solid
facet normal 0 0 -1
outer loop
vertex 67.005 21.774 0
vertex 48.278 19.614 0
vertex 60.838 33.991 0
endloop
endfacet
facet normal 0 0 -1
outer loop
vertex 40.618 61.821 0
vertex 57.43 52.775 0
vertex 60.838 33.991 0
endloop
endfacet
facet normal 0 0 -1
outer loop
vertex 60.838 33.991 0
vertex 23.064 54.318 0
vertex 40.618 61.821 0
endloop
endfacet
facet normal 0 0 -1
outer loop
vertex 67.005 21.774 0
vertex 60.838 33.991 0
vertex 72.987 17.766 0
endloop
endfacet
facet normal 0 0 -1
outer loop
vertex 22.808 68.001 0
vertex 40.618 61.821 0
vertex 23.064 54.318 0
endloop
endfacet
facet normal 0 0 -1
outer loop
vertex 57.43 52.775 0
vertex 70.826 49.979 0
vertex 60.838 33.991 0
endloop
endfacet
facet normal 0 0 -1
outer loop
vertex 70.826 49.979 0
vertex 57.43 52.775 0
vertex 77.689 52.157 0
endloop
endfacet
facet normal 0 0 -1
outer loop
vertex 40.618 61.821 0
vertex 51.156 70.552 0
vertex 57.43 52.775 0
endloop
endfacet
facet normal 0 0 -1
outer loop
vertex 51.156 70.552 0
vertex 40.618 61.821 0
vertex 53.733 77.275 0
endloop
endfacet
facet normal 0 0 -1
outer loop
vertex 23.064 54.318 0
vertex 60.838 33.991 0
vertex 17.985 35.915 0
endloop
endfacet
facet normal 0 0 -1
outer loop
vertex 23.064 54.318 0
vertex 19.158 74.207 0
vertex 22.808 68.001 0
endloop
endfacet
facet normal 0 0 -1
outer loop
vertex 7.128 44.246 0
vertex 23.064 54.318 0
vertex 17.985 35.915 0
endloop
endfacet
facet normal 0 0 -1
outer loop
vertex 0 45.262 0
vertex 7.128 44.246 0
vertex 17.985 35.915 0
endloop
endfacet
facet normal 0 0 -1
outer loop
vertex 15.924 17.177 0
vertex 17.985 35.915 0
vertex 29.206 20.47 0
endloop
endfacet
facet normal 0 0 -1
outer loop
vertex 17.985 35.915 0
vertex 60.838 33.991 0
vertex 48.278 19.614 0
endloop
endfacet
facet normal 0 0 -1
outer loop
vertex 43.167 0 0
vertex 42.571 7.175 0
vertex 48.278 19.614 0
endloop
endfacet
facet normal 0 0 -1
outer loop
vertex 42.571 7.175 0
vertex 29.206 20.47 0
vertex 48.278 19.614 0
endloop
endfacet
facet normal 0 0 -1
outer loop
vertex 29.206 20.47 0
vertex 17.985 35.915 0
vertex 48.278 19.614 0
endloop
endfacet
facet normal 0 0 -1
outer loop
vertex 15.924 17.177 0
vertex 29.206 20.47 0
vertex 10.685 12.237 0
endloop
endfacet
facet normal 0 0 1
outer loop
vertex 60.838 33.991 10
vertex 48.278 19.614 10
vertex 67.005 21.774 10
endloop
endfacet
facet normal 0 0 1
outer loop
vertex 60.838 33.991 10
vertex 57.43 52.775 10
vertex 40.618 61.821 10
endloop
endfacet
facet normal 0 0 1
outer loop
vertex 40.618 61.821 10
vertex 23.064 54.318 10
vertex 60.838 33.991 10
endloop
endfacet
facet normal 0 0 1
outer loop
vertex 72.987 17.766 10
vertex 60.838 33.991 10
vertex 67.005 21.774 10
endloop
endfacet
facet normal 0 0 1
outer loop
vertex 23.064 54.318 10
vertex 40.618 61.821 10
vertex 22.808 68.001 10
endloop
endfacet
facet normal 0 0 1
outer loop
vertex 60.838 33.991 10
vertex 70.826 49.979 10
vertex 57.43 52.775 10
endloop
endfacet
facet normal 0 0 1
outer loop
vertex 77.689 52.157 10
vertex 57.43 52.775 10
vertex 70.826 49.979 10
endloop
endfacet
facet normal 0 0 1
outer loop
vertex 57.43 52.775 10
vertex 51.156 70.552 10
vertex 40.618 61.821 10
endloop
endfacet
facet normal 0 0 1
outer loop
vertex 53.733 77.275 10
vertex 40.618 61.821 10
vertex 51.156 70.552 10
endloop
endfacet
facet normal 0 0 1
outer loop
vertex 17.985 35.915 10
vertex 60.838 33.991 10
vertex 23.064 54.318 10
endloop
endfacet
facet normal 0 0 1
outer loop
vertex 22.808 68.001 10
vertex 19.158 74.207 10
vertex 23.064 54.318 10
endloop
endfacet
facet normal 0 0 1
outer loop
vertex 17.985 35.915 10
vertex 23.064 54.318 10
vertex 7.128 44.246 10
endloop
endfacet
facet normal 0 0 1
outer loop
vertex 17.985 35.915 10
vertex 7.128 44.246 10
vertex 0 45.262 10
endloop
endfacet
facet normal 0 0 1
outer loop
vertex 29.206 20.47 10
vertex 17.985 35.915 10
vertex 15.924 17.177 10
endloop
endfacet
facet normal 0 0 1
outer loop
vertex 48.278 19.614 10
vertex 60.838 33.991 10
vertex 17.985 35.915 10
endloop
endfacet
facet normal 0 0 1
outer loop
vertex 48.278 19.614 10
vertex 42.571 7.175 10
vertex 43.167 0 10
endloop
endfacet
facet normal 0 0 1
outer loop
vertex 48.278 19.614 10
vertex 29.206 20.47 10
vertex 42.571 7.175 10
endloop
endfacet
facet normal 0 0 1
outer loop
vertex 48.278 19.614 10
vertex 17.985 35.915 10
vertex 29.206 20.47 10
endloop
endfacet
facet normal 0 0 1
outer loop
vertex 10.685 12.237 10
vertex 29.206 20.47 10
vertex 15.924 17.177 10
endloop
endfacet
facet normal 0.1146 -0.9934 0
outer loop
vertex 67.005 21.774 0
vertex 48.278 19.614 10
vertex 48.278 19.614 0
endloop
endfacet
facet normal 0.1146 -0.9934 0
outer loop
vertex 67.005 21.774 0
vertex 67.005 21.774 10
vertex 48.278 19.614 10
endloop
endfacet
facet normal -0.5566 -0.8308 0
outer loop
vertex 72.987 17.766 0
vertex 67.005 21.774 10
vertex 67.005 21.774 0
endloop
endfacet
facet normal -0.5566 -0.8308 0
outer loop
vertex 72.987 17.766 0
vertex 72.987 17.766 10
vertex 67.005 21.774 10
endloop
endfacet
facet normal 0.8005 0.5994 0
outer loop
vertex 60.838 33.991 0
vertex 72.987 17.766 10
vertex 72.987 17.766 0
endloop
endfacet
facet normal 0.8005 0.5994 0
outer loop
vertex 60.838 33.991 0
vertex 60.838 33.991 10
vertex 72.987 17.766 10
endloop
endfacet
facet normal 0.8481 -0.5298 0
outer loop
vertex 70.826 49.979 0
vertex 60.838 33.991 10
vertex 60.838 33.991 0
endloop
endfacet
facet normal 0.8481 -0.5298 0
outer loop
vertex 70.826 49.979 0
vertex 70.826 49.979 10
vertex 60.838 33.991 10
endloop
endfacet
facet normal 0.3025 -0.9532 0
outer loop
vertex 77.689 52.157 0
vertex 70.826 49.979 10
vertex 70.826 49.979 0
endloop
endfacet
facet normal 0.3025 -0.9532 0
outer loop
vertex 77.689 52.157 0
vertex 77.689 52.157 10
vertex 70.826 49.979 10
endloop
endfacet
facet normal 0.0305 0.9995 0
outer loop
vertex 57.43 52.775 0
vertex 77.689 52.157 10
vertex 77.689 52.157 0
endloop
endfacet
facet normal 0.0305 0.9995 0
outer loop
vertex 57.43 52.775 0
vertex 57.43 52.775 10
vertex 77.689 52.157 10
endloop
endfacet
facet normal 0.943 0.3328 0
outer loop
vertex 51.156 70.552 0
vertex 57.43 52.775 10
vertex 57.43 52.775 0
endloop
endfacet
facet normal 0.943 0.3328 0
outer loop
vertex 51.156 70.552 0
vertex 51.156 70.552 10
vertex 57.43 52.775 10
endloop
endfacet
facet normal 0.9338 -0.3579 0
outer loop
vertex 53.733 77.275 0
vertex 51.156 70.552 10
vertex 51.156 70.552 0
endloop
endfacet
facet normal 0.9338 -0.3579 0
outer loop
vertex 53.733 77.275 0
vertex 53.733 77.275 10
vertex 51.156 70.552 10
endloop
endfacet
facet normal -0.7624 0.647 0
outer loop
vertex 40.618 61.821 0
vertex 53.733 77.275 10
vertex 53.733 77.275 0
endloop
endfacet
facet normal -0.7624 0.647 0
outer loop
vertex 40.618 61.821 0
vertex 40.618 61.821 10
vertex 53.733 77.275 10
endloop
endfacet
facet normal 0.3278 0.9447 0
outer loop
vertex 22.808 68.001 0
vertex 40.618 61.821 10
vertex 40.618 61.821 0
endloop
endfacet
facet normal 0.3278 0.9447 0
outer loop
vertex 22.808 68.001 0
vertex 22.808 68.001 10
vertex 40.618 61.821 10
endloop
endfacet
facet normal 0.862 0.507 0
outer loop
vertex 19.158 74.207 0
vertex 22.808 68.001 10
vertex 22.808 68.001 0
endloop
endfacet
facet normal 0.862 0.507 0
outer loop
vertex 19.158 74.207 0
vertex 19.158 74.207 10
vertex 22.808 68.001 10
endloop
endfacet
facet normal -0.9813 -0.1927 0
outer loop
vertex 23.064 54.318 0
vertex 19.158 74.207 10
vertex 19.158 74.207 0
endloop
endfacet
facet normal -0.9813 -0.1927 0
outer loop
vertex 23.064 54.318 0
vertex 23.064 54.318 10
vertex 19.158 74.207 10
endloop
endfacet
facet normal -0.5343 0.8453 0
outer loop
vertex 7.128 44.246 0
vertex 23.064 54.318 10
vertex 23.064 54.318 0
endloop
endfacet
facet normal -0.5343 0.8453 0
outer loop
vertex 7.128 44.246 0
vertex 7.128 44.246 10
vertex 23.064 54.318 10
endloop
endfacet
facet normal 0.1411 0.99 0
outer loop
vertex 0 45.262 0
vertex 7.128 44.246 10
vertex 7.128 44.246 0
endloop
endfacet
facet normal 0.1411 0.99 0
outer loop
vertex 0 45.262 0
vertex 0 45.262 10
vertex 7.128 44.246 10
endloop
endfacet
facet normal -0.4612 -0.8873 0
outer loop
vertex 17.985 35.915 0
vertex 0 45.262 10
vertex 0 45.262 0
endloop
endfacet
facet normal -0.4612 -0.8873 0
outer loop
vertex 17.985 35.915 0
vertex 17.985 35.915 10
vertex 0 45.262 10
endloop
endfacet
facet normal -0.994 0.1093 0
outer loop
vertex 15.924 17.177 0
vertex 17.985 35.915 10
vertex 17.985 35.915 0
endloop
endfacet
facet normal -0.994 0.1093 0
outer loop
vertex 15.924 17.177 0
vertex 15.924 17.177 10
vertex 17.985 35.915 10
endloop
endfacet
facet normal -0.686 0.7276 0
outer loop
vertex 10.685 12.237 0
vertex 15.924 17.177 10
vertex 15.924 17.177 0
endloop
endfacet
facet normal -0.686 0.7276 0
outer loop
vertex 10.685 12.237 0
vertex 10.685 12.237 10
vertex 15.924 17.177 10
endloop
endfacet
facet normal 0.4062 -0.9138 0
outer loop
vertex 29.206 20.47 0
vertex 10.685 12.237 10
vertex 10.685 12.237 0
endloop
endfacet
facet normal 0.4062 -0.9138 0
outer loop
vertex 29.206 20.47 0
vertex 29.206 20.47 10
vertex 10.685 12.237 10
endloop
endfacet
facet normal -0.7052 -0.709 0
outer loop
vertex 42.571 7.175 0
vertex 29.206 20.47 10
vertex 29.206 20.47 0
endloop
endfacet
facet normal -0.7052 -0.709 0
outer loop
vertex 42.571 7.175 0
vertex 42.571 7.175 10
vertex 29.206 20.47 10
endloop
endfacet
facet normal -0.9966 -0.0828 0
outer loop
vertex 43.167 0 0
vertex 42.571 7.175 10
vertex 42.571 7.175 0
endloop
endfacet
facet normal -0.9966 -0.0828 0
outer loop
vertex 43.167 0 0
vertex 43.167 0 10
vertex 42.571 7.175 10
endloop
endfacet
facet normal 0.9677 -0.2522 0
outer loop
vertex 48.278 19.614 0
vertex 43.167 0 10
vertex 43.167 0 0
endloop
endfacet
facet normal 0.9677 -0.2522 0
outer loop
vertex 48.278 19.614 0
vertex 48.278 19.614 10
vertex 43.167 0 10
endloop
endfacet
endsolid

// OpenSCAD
$fn = 32;

// ----------------------------------------------------------------------
// Fan rotor section: 7 blades, 22 mm hub radius, 18 mm blades
// ----------------------------------------------------------------------

// --- parameters (mm) ---
profile_height = 10;      // extrusion height
profile_points = 21;      // points of the closed outline

profile = [[60.838, 33.991], [70.826, 49.979], [77.689, 52.157], [57.43, 52.775], [51.156, 70.552], [53.733, 77.275], [40.618, 61.821], [22.808, 68.001], [19.158, 74.207], [23.064, 54.318], [7.128, 44.246], [0, 45.262], [17.985, 35.915], [15.924, 17.177], [10.685, 12.237], [29.206, 20.47], [42.571, 7.175], [43.167, 0], [48.278, 19.614], [67.005, 21.774], [72.987, 17.766]];  // single closed polygon, 21 points, counter clockwise

// --- the one profile operation ---
linear_extrude(height = profile_height) polygon(points = profile);
